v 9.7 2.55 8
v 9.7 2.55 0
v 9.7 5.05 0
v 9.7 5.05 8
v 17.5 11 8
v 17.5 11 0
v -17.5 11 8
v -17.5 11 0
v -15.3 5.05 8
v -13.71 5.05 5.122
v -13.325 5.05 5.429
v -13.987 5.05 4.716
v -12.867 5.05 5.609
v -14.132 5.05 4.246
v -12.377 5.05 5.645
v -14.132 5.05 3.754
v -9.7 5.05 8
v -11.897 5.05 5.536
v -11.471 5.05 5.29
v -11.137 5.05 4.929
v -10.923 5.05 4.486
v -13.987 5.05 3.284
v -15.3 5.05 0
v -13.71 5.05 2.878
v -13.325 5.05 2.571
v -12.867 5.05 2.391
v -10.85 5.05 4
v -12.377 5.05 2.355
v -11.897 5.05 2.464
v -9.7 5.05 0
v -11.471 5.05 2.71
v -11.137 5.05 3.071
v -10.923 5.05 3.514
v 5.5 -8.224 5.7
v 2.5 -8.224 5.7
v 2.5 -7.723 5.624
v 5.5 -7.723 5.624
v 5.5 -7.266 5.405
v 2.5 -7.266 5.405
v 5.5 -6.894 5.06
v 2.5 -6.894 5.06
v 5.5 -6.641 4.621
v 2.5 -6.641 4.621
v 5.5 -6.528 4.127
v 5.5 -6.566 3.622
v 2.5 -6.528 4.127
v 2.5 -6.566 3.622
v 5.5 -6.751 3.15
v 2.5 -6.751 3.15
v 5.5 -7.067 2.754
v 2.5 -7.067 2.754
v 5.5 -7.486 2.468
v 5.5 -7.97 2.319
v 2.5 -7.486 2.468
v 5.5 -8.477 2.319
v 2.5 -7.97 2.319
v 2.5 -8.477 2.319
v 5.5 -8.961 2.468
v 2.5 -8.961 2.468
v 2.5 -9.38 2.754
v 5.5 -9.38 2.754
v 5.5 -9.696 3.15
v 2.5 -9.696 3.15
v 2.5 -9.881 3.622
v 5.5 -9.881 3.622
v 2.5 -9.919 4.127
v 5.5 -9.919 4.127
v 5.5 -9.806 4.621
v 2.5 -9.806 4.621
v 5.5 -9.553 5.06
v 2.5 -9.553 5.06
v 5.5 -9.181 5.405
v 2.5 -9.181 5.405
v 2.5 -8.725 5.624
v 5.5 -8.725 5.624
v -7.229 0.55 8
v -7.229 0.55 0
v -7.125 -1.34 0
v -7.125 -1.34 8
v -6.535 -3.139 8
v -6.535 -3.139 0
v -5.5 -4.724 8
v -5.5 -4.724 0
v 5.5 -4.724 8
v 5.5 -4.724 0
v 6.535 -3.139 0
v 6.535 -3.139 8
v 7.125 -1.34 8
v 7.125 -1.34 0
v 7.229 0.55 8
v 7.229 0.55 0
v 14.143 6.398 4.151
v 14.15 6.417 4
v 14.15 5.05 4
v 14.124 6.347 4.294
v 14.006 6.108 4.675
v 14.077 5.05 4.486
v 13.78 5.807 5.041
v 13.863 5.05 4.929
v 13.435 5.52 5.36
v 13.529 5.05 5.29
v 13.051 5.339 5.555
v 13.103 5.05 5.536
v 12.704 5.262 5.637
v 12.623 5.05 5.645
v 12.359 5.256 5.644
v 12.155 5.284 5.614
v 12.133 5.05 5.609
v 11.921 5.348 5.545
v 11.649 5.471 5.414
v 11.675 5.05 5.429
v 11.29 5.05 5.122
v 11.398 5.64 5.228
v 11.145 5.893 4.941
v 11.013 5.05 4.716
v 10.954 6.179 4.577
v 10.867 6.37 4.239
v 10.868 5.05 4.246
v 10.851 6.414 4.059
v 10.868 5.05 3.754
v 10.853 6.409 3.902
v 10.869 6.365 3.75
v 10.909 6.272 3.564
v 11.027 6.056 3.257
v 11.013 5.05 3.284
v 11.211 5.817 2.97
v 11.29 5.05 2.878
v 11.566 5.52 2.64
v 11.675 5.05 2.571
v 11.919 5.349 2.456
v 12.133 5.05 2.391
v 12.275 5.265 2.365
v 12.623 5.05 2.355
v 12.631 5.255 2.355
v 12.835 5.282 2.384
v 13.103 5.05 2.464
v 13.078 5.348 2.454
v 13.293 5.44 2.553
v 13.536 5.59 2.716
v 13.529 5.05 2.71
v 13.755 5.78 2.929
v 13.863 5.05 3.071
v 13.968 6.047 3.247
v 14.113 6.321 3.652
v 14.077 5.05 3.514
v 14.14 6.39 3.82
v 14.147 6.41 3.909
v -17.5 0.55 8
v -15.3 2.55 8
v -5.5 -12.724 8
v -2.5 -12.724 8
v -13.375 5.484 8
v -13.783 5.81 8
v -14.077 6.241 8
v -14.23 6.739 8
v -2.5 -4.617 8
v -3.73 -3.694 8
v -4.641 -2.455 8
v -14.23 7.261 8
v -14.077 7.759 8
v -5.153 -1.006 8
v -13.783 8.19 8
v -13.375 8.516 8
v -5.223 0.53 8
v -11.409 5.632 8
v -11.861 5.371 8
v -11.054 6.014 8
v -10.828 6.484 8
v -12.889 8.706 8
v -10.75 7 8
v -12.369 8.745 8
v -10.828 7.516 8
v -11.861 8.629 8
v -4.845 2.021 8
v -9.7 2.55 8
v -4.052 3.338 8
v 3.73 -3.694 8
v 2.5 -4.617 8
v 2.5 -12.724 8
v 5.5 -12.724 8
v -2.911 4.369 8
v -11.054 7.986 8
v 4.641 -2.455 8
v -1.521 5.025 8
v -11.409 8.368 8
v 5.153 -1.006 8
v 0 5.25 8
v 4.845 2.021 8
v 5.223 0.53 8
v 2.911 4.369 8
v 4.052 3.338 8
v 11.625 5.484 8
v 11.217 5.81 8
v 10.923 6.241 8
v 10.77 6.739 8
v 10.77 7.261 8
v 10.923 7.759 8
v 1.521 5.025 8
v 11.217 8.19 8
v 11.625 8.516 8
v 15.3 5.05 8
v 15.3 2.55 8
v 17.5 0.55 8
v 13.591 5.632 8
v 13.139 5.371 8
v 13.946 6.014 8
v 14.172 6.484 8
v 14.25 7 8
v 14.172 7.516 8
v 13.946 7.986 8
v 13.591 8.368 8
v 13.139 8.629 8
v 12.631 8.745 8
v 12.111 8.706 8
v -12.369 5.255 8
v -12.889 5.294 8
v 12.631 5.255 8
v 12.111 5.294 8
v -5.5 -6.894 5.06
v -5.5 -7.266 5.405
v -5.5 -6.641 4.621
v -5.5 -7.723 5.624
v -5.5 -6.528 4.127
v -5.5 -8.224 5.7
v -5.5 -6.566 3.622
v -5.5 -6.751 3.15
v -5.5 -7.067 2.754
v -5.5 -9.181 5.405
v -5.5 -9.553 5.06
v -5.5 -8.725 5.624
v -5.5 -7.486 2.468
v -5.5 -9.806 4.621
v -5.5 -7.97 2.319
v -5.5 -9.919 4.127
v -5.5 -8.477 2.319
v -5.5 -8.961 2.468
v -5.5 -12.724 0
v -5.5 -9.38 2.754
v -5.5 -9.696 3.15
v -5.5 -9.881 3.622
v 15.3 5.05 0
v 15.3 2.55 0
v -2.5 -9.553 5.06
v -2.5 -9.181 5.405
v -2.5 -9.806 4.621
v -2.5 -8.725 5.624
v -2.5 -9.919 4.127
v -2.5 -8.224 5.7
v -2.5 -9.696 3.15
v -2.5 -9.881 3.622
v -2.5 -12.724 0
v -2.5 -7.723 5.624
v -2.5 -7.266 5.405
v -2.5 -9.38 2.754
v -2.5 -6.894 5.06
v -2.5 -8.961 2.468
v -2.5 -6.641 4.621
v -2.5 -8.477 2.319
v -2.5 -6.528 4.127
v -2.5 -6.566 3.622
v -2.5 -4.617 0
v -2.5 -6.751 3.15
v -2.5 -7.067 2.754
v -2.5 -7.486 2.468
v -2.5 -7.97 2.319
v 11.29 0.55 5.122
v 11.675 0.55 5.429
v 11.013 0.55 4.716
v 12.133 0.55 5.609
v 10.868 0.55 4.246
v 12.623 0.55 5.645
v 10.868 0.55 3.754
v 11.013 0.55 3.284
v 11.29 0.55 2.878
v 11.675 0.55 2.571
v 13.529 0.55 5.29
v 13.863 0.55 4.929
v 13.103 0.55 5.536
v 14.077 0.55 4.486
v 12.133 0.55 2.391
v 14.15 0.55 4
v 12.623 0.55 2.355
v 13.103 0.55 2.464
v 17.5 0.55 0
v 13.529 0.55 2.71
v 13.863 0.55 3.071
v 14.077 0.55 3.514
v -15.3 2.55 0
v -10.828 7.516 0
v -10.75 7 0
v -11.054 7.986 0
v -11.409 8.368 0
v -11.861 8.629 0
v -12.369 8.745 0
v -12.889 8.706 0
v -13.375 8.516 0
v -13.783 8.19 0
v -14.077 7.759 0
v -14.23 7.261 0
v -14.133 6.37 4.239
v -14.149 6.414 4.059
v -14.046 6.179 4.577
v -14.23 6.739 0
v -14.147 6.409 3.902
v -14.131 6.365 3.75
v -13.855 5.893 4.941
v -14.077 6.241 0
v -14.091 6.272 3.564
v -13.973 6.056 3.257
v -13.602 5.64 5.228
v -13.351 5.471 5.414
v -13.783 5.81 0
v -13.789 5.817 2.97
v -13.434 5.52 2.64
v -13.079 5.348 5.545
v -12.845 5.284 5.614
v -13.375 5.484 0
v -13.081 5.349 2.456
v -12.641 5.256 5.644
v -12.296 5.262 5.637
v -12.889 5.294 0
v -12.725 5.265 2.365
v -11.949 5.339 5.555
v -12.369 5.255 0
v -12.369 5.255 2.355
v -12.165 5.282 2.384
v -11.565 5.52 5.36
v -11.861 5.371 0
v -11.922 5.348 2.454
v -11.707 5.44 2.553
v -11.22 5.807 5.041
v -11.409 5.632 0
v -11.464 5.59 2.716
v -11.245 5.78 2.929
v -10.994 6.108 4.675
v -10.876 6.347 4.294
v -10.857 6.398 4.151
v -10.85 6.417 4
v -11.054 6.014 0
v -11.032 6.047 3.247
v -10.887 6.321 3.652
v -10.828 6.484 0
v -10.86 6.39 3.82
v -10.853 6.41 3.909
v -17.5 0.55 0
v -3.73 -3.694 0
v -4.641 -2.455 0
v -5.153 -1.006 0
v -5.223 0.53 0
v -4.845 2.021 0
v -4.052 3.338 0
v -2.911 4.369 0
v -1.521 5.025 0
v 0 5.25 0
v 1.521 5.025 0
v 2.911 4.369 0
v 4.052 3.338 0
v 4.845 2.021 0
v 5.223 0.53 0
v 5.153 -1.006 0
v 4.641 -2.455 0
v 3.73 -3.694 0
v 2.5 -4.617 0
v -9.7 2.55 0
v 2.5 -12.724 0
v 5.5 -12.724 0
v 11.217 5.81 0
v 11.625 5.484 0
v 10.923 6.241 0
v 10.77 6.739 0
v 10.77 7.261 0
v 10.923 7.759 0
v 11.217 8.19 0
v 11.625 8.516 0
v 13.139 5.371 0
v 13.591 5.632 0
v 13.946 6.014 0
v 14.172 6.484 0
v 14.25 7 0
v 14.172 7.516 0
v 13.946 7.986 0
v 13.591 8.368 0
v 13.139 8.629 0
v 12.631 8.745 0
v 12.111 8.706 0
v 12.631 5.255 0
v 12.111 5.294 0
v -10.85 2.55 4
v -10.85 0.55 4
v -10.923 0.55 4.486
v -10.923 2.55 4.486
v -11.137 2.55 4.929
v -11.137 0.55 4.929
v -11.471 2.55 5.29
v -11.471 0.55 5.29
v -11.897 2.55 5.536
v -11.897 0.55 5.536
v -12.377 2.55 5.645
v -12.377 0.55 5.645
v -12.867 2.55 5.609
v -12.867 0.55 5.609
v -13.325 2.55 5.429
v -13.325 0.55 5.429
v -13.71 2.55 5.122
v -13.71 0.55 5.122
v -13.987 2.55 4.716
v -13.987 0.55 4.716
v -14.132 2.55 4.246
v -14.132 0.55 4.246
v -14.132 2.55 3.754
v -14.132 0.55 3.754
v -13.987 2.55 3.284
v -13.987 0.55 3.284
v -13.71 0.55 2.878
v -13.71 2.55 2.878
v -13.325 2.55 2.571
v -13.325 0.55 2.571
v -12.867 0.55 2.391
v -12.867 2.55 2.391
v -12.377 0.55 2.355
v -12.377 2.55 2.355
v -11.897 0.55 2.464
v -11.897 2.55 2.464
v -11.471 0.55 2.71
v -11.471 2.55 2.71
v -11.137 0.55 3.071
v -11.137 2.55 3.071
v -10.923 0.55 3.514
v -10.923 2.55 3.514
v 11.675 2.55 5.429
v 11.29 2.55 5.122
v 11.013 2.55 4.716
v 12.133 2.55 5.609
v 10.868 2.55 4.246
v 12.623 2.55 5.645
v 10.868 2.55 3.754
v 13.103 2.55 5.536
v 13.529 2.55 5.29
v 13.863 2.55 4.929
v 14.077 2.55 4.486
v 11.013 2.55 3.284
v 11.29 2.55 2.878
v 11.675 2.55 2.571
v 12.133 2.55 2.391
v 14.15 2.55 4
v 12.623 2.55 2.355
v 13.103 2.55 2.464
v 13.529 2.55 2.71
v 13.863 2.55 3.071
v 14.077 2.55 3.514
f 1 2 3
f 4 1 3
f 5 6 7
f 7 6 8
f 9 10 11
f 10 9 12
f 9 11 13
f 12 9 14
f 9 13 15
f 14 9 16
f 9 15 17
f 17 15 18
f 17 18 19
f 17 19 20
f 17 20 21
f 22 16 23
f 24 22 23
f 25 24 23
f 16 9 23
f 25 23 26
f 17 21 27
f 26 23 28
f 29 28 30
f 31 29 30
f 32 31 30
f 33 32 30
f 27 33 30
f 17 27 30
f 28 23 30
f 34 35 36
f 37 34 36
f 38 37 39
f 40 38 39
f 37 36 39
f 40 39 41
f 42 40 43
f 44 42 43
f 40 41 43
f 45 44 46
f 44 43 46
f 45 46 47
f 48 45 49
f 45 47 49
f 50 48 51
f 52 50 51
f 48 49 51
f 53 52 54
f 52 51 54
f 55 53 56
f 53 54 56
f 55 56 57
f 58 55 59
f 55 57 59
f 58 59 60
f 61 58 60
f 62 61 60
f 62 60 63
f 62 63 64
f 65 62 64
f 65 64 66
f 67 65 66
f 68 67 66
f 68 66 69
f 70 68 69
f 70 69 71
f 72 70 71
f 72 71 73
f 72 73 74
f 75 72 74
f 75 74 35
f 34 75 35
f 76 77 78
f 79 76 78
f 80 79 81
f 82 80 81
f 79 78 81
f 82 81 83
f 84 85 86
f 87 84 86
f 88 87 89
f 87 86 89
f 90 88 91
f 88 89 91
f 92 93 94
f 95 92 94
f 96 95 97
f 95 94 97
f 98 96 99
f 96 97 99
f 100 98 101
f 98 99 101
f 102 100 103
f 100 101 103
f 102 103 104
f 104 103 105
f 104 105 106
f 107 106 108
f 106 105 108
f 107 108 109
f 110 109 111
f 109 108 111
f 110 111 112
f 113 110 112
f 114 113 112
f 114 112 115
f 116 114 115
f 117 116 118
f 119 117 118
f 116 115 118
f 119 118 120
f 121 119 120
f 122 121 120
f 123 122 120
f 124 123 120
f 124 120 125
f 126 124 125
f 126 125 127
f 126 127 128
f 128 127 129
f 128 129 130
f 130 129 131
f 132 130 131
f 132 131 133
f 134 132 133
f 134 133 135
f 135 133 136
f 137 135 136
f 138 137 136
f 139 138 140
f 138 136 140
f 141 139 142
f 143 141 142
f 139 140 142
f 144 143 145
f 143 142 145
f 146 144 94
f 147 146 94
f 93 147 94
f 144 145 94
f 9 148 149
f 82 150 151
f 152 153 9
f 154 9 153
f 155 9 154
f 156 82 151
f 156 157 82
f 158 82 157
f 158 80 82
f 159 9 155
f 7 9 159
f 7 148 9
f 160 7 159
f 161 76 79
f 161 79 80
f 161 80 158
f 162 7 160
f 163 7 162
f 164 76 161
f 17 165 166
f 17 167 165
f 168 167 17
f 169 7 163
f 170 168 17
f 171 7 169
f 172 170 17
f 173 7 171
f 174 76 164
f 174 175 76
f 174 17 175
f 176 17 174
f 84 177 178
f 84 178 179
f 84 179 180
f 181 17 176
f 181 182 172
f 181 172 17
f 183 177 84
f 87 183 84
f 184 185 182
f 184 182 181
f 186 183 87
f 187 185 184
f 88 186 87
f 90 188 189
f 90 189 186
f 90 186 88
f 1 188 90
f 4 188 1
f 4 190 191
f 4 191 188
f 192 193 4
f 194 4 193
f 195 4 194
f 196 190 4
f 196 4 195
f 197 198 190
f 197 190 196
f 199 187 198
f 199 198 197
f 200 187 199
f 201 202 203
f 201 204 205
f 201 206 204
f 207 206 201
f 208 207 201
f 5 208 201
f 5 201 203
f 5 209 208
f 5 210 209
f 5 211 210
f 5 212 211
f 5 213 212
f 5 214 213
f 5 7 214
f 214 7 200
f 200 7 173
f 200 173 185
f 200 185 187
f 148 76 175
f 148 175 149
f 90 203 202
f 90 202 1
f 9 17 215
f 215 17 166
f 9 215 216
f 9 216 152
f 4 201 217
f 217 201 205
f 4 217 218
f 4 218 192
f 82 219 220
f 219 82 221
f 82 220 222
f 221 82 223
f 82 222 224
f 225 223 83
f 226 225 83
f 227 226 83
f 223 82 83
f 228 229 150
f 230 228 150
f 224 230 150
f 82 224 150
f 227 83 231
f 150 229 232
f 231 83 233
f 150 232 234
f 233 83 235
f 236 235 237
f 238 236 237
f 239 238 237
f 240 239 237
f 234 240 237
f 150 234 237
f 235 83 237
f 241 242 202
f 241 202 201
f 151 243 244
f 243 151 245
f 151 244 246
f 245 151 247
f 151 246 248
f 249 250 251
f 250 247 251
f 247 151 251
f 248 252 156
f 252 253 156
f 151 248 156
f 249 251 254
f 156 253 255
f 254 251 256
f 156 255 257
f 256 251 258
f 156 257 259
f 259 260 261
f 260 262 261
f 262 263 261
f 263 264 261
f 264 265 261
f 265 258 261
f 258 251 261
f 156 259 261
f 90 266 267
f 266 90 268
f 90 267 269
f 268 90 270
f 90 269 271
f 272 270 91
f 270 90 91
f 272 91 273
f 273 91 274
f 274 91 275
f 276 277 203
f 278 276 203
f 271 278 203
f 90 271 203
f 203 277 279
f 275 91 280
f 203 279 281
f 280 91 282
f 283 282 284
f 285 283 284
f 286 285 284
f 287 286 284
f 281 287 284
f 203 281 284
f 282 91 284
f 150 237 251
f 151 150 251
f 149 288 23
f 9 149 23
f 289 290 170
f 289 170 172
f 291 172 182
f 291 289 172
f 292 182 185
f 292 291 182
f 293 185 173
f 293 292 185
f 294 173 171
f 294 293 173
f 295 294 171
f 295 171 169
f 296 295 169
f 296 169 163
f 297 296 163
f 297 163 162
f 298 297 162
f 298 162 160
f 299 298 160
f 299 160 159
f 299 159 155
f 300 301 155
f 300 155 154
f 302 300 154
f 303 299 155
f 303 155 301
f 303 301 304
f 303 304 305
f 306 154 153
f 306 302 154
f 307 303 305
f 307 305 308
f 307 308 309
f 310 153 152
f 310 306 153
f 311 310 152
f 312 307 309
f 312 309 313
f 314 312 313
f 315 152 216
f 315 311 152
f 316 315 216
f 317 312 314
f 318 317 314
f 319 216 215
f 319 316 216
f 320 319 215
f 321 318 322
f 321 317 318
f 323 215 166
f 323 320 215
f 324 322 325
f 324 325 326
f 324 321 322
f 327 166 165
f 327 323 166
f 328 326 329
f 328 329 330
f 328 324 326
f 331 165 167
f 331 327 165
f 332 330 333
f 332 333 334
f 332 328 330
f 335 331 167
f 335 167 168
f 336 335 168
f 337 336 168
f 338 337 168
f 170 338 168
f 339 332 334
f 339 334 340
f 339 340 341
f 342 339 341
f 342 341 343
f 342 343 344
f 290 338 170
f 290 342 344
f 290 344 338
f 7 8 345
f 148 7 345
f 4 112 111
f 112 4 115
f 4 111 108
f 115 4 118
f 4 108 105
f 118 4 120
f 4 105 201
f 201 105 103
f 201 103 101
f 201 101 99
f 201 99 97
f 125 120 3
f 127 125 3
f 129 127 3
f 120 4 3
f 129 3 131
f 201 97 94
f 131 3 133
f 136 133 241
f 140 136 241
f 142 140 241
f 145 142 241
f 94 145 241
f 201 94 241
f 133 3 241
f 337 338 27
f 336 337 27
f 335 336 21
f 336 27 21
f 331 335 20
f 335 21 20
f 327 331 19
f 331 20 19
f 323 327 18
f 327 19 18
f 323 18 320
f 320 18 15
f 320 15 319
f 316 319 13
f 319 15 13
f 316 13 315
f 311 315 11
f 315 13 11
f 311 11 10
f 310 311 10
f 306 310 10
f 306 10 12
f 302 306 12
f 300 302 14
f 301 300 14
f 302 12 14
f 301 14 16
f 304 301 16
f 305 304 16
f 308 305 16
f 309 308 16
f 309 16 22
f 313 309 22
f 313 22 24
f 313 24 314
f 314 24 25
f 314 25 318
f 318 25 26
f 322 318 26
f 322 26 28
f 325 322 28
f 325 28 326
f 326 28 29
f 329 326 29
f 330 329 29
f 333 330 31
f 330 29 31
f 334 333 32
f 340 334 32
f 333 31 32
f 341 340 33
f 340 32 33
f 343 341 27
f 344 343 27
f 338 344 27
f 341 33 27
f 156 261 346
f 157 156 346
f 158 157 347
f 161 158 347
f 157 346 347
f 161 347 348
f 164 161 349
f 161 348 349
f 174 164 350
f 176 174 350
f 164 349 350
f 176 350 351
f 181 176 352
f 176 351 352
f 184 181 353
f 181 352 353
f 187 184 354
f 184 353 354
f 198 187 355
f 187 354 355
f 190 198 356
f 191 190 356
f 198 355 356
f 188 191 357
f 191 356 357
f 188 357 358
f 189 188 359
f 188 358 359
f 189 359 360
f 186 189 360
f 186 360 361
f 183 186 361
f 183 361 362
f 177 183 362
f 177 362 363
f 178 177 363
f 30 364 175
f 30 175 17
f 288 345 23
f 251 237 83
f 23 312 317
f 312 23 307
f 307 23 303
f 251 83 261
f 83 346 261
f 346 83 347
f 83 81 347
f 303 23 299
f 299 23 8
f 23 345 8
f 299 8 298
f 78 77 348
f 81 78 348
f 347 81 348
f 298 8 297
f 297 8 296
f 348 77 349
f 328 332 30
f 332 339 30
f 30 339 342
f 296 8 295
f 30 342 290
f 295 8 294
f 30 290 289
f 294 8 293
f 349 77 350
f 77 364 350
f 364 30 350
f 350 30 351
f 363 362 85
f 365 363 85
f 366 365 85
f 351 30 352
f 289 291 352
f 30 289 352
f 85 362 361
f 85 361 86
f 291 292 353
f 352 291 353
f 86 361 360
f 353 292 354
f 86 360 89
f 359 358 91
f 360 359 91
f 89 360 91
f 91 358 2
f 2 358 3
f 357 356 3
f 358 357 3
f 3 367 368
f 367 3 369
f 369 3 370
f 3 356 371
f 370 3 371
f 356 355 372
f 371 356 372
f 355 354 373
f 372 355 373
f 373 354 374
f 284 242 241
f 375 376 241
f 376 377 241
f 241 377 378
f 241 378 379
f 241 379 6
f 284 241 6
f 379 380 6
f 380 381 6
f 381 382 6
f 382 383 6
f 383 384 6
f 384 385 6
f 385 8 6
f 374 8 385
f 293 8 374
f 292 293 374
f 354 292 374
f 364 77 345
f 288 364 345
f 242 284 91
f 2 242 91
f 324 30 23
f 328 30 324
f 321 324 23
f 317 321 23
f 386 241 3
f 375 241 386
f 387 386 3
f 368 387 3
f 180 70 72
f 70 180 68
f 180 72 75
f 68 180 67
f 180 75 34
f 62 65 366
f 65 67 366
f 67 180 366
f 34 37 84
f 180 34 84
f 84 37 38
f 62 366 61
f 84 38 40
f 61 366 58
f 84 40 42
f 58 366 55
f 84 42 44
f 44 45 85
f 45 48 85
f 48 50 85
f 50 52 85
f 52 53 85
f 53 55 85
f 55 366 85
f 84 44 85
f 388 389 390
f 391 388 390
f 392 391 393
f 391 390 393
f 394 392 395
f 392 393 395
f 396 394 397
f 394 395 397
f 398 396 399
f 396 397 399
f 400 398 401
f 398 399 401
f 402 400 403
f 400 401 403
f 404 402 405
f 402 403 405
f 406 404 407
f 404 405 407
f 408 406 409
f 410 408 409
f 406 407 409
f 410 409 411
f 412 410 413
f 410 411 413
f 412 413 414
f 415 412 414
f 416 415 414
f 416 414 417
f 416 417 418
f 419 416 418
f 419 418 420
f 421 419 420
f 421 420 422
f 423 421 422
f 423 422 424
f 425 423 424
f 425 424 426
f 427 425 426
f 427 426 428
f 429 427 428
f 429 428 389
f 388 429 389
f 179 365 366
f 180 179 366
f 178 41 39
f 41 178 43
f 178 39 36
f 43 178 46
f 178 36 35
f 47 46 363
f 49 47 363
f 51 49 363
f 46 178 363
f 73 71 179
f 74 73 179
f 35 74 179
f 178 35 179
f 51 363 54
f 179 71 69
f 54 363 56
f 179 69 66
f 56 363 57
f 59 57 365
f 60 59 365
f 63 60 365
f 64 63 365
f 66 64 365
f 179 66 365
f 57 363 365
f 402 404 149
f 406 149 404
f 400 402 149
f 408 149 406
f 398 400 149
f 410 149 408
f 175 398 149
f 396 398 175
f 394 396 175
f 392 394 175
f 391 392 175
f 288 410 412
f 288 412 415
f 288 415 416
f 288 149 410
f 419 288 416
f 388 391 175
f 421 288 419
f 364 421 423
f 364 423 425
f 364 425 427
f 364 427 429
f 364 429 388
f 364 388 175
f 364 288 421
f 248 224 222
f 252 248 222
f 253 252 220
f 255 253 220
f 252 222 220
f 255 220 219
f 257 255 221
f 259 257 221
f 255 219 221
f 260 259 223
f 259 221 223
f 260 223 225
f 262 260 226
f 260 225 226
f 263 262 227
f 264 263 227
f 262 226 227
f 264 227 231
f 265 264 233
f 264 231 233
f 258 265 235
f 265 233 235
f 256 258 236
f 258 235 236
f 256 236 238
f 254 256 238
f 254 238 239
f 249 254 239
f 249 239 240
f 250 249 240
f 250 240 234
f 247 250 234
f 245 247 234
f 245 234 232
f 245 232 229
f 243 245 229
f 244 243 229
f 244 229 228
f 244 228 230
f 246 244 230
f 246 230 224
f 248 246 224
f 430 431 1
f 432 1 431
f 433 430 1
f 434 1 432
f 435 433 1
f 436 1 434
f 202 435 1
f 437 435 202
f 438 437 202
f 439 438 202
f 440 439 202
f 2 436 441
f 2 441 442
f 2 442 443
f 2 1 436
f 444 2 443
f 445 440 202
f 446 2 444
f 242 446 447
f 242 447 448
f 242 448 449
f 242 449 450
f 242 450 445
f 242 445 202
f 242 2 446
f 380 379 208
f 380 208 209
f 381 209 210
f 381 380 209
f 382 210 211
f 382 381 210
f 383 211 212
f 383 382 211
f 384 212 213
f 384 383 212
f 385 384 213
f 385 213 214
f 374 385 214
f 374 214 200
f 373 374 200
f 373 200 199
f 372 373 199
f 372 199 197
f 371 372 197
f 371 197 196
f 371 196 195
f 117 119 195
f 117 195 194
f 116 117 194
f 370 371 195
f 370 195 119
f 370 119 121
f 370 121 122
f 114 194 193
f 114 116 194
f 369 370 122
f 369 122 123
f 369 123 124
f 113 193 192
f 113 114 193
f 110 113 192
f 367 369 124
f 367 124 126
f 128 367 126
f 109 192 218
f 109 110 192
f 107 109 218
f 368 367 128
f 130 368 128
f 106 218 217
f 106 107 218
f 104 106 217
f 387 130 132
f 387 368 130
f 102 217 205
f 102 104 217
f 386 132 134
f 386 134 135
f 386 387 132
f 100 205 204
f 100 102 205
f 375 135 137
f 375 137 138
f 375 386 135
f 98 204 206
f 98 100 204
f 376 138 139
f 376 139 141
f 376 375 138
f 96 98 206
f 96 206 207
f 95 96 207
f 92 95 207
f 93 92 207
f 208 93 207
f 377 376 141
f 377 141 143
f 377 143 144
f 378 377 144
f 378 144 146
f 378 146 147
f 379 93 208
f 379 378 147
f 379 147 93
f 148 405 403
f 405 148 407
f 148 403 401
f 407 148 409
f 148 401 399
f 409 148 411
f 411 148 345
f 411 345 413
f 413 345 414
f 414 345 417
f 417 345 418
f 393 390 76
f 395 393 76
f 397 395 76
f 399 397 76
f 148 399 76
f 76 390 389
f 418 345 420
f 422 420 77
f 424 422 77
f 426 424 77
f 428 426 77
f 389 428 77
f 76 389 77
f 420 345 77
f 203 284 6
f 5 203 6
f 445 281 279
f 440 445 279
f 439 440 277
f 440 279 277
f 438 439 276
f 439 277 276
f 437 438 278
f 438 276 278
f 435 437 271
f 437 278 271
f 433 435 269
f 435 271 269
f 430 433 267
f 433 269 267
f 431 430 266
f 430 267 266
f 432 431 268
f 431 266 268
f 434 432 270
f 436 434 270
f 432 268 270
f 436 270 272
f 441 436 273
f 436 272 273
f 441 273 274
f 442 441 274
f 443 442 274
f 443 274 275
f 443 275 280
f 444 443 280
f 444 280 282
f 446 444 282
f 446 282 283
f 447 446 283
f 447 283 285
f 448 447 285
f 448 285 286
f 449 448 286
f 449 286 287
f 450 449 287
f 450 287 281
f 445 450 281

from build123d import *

# Parameters (mm, degrees)
ESBO_O1_R                = 1.75
ESBO_O1_W                = 5.6
ESBO_O1_H                = 2.5
RESSALTO_EXTRUS_O1_DEPTH = 8
ESBO_O2_R                = 1.65
CORTE_EXTRUS_O1_DEPTH    = 7
ESBO_O3_R                = 1.7
CORTE_EXTRUS_O2_DEPTH    = 24


with BuildPart() as part:
    # Esboço1 → Ressalto-extrusão1 (new body)
    with BuildSketch(Plane.XY):
        with BuildLine():
            Line((17.5, 11), (0, 11))
            Line((0, 11), (-17.5, 11))
            Line((-17.5, 11), (-17.5, 0.55))
            Line((-17.5, 0.55), (-7.229107829, 0.55))
            ThreePointArc((-7.229107829, 0.55), (-6.889142873, -2.258807312), (-5.5, -4.723610907))
            Line((-5.5, -4.723610907), (-5.5, -12.723610907))
            Line((-5.5, -12.723610907), (-2.5, -12.723610907))
            Line((-2.5, -12.723610907), (-2.5, -4.616546328))
            ThreePointArc((-2.5, -4.616546328), (0, 5.25), (2.5, -4.616546328))
            Line((2.5, -4.616546328), (2.5, -12.723610907))
            Line((2.5, -12.723610907), (5.5, -12.723610907))
            Line((5.5, -12.723610907), (5.5, -4.723610907))
            ThreePointArc((5.5, -4.723610907), (6.889142873, -2.258807312), (7.229107829, 0.55))
            Line((7.229107829, 0.55), (17.5, 0.55))
            Line((17.5, 0.55), (17.5, 11))
        make_face()
        with Locations((12.5, 7)):
            Circle(ESBO_O1_R, mode=Mode.SUBTRACT)
        with Locations((-12.5, 7)):
            Circle(ESBO_O1_R, mode=Mode.SUBTRACT)
        with Locations((-12.5, 3.8)):
            Rectangle(ESBO_O1_W, ESBO_O1_H, mode=Mode.SUBTRACT)
        with Locations((12.5, 3.8)):
            Rectangle(ESBO_O1_W, ESBO_O1_H, mode=Mode.SUBTRACT)
    extrude(amount=RESSALTO_EXTRUS_O1_DEPTH)

    # Esboço2 → Corte-extrusão1 (cut)
    with BuildSketch(Plane.XZ.offset(-0.55)):
        with Locations((-12.5, 4)):
            Circle(ESBO_O2_R)
        with Locations((12.5, 4)):
            Circle(ESBO_O2_R)
    extrude(amount=-CORTE_EXTRUS_O1_DEPTH, mode=Mode.SUBTRACT)

    # Esboço3 → Corte-extrusão2 (cut, through all)
    with BuildSketch(Plane.ZY.offset(5.5)):
        with Locations((4, -8.223610907)):
            Circle(ESBO_O3_R)
    extrude(amount=-CORTE_EXTRUS_O2_DEPTH, mode=Mode.SUBTRACT)


solid = part.part
